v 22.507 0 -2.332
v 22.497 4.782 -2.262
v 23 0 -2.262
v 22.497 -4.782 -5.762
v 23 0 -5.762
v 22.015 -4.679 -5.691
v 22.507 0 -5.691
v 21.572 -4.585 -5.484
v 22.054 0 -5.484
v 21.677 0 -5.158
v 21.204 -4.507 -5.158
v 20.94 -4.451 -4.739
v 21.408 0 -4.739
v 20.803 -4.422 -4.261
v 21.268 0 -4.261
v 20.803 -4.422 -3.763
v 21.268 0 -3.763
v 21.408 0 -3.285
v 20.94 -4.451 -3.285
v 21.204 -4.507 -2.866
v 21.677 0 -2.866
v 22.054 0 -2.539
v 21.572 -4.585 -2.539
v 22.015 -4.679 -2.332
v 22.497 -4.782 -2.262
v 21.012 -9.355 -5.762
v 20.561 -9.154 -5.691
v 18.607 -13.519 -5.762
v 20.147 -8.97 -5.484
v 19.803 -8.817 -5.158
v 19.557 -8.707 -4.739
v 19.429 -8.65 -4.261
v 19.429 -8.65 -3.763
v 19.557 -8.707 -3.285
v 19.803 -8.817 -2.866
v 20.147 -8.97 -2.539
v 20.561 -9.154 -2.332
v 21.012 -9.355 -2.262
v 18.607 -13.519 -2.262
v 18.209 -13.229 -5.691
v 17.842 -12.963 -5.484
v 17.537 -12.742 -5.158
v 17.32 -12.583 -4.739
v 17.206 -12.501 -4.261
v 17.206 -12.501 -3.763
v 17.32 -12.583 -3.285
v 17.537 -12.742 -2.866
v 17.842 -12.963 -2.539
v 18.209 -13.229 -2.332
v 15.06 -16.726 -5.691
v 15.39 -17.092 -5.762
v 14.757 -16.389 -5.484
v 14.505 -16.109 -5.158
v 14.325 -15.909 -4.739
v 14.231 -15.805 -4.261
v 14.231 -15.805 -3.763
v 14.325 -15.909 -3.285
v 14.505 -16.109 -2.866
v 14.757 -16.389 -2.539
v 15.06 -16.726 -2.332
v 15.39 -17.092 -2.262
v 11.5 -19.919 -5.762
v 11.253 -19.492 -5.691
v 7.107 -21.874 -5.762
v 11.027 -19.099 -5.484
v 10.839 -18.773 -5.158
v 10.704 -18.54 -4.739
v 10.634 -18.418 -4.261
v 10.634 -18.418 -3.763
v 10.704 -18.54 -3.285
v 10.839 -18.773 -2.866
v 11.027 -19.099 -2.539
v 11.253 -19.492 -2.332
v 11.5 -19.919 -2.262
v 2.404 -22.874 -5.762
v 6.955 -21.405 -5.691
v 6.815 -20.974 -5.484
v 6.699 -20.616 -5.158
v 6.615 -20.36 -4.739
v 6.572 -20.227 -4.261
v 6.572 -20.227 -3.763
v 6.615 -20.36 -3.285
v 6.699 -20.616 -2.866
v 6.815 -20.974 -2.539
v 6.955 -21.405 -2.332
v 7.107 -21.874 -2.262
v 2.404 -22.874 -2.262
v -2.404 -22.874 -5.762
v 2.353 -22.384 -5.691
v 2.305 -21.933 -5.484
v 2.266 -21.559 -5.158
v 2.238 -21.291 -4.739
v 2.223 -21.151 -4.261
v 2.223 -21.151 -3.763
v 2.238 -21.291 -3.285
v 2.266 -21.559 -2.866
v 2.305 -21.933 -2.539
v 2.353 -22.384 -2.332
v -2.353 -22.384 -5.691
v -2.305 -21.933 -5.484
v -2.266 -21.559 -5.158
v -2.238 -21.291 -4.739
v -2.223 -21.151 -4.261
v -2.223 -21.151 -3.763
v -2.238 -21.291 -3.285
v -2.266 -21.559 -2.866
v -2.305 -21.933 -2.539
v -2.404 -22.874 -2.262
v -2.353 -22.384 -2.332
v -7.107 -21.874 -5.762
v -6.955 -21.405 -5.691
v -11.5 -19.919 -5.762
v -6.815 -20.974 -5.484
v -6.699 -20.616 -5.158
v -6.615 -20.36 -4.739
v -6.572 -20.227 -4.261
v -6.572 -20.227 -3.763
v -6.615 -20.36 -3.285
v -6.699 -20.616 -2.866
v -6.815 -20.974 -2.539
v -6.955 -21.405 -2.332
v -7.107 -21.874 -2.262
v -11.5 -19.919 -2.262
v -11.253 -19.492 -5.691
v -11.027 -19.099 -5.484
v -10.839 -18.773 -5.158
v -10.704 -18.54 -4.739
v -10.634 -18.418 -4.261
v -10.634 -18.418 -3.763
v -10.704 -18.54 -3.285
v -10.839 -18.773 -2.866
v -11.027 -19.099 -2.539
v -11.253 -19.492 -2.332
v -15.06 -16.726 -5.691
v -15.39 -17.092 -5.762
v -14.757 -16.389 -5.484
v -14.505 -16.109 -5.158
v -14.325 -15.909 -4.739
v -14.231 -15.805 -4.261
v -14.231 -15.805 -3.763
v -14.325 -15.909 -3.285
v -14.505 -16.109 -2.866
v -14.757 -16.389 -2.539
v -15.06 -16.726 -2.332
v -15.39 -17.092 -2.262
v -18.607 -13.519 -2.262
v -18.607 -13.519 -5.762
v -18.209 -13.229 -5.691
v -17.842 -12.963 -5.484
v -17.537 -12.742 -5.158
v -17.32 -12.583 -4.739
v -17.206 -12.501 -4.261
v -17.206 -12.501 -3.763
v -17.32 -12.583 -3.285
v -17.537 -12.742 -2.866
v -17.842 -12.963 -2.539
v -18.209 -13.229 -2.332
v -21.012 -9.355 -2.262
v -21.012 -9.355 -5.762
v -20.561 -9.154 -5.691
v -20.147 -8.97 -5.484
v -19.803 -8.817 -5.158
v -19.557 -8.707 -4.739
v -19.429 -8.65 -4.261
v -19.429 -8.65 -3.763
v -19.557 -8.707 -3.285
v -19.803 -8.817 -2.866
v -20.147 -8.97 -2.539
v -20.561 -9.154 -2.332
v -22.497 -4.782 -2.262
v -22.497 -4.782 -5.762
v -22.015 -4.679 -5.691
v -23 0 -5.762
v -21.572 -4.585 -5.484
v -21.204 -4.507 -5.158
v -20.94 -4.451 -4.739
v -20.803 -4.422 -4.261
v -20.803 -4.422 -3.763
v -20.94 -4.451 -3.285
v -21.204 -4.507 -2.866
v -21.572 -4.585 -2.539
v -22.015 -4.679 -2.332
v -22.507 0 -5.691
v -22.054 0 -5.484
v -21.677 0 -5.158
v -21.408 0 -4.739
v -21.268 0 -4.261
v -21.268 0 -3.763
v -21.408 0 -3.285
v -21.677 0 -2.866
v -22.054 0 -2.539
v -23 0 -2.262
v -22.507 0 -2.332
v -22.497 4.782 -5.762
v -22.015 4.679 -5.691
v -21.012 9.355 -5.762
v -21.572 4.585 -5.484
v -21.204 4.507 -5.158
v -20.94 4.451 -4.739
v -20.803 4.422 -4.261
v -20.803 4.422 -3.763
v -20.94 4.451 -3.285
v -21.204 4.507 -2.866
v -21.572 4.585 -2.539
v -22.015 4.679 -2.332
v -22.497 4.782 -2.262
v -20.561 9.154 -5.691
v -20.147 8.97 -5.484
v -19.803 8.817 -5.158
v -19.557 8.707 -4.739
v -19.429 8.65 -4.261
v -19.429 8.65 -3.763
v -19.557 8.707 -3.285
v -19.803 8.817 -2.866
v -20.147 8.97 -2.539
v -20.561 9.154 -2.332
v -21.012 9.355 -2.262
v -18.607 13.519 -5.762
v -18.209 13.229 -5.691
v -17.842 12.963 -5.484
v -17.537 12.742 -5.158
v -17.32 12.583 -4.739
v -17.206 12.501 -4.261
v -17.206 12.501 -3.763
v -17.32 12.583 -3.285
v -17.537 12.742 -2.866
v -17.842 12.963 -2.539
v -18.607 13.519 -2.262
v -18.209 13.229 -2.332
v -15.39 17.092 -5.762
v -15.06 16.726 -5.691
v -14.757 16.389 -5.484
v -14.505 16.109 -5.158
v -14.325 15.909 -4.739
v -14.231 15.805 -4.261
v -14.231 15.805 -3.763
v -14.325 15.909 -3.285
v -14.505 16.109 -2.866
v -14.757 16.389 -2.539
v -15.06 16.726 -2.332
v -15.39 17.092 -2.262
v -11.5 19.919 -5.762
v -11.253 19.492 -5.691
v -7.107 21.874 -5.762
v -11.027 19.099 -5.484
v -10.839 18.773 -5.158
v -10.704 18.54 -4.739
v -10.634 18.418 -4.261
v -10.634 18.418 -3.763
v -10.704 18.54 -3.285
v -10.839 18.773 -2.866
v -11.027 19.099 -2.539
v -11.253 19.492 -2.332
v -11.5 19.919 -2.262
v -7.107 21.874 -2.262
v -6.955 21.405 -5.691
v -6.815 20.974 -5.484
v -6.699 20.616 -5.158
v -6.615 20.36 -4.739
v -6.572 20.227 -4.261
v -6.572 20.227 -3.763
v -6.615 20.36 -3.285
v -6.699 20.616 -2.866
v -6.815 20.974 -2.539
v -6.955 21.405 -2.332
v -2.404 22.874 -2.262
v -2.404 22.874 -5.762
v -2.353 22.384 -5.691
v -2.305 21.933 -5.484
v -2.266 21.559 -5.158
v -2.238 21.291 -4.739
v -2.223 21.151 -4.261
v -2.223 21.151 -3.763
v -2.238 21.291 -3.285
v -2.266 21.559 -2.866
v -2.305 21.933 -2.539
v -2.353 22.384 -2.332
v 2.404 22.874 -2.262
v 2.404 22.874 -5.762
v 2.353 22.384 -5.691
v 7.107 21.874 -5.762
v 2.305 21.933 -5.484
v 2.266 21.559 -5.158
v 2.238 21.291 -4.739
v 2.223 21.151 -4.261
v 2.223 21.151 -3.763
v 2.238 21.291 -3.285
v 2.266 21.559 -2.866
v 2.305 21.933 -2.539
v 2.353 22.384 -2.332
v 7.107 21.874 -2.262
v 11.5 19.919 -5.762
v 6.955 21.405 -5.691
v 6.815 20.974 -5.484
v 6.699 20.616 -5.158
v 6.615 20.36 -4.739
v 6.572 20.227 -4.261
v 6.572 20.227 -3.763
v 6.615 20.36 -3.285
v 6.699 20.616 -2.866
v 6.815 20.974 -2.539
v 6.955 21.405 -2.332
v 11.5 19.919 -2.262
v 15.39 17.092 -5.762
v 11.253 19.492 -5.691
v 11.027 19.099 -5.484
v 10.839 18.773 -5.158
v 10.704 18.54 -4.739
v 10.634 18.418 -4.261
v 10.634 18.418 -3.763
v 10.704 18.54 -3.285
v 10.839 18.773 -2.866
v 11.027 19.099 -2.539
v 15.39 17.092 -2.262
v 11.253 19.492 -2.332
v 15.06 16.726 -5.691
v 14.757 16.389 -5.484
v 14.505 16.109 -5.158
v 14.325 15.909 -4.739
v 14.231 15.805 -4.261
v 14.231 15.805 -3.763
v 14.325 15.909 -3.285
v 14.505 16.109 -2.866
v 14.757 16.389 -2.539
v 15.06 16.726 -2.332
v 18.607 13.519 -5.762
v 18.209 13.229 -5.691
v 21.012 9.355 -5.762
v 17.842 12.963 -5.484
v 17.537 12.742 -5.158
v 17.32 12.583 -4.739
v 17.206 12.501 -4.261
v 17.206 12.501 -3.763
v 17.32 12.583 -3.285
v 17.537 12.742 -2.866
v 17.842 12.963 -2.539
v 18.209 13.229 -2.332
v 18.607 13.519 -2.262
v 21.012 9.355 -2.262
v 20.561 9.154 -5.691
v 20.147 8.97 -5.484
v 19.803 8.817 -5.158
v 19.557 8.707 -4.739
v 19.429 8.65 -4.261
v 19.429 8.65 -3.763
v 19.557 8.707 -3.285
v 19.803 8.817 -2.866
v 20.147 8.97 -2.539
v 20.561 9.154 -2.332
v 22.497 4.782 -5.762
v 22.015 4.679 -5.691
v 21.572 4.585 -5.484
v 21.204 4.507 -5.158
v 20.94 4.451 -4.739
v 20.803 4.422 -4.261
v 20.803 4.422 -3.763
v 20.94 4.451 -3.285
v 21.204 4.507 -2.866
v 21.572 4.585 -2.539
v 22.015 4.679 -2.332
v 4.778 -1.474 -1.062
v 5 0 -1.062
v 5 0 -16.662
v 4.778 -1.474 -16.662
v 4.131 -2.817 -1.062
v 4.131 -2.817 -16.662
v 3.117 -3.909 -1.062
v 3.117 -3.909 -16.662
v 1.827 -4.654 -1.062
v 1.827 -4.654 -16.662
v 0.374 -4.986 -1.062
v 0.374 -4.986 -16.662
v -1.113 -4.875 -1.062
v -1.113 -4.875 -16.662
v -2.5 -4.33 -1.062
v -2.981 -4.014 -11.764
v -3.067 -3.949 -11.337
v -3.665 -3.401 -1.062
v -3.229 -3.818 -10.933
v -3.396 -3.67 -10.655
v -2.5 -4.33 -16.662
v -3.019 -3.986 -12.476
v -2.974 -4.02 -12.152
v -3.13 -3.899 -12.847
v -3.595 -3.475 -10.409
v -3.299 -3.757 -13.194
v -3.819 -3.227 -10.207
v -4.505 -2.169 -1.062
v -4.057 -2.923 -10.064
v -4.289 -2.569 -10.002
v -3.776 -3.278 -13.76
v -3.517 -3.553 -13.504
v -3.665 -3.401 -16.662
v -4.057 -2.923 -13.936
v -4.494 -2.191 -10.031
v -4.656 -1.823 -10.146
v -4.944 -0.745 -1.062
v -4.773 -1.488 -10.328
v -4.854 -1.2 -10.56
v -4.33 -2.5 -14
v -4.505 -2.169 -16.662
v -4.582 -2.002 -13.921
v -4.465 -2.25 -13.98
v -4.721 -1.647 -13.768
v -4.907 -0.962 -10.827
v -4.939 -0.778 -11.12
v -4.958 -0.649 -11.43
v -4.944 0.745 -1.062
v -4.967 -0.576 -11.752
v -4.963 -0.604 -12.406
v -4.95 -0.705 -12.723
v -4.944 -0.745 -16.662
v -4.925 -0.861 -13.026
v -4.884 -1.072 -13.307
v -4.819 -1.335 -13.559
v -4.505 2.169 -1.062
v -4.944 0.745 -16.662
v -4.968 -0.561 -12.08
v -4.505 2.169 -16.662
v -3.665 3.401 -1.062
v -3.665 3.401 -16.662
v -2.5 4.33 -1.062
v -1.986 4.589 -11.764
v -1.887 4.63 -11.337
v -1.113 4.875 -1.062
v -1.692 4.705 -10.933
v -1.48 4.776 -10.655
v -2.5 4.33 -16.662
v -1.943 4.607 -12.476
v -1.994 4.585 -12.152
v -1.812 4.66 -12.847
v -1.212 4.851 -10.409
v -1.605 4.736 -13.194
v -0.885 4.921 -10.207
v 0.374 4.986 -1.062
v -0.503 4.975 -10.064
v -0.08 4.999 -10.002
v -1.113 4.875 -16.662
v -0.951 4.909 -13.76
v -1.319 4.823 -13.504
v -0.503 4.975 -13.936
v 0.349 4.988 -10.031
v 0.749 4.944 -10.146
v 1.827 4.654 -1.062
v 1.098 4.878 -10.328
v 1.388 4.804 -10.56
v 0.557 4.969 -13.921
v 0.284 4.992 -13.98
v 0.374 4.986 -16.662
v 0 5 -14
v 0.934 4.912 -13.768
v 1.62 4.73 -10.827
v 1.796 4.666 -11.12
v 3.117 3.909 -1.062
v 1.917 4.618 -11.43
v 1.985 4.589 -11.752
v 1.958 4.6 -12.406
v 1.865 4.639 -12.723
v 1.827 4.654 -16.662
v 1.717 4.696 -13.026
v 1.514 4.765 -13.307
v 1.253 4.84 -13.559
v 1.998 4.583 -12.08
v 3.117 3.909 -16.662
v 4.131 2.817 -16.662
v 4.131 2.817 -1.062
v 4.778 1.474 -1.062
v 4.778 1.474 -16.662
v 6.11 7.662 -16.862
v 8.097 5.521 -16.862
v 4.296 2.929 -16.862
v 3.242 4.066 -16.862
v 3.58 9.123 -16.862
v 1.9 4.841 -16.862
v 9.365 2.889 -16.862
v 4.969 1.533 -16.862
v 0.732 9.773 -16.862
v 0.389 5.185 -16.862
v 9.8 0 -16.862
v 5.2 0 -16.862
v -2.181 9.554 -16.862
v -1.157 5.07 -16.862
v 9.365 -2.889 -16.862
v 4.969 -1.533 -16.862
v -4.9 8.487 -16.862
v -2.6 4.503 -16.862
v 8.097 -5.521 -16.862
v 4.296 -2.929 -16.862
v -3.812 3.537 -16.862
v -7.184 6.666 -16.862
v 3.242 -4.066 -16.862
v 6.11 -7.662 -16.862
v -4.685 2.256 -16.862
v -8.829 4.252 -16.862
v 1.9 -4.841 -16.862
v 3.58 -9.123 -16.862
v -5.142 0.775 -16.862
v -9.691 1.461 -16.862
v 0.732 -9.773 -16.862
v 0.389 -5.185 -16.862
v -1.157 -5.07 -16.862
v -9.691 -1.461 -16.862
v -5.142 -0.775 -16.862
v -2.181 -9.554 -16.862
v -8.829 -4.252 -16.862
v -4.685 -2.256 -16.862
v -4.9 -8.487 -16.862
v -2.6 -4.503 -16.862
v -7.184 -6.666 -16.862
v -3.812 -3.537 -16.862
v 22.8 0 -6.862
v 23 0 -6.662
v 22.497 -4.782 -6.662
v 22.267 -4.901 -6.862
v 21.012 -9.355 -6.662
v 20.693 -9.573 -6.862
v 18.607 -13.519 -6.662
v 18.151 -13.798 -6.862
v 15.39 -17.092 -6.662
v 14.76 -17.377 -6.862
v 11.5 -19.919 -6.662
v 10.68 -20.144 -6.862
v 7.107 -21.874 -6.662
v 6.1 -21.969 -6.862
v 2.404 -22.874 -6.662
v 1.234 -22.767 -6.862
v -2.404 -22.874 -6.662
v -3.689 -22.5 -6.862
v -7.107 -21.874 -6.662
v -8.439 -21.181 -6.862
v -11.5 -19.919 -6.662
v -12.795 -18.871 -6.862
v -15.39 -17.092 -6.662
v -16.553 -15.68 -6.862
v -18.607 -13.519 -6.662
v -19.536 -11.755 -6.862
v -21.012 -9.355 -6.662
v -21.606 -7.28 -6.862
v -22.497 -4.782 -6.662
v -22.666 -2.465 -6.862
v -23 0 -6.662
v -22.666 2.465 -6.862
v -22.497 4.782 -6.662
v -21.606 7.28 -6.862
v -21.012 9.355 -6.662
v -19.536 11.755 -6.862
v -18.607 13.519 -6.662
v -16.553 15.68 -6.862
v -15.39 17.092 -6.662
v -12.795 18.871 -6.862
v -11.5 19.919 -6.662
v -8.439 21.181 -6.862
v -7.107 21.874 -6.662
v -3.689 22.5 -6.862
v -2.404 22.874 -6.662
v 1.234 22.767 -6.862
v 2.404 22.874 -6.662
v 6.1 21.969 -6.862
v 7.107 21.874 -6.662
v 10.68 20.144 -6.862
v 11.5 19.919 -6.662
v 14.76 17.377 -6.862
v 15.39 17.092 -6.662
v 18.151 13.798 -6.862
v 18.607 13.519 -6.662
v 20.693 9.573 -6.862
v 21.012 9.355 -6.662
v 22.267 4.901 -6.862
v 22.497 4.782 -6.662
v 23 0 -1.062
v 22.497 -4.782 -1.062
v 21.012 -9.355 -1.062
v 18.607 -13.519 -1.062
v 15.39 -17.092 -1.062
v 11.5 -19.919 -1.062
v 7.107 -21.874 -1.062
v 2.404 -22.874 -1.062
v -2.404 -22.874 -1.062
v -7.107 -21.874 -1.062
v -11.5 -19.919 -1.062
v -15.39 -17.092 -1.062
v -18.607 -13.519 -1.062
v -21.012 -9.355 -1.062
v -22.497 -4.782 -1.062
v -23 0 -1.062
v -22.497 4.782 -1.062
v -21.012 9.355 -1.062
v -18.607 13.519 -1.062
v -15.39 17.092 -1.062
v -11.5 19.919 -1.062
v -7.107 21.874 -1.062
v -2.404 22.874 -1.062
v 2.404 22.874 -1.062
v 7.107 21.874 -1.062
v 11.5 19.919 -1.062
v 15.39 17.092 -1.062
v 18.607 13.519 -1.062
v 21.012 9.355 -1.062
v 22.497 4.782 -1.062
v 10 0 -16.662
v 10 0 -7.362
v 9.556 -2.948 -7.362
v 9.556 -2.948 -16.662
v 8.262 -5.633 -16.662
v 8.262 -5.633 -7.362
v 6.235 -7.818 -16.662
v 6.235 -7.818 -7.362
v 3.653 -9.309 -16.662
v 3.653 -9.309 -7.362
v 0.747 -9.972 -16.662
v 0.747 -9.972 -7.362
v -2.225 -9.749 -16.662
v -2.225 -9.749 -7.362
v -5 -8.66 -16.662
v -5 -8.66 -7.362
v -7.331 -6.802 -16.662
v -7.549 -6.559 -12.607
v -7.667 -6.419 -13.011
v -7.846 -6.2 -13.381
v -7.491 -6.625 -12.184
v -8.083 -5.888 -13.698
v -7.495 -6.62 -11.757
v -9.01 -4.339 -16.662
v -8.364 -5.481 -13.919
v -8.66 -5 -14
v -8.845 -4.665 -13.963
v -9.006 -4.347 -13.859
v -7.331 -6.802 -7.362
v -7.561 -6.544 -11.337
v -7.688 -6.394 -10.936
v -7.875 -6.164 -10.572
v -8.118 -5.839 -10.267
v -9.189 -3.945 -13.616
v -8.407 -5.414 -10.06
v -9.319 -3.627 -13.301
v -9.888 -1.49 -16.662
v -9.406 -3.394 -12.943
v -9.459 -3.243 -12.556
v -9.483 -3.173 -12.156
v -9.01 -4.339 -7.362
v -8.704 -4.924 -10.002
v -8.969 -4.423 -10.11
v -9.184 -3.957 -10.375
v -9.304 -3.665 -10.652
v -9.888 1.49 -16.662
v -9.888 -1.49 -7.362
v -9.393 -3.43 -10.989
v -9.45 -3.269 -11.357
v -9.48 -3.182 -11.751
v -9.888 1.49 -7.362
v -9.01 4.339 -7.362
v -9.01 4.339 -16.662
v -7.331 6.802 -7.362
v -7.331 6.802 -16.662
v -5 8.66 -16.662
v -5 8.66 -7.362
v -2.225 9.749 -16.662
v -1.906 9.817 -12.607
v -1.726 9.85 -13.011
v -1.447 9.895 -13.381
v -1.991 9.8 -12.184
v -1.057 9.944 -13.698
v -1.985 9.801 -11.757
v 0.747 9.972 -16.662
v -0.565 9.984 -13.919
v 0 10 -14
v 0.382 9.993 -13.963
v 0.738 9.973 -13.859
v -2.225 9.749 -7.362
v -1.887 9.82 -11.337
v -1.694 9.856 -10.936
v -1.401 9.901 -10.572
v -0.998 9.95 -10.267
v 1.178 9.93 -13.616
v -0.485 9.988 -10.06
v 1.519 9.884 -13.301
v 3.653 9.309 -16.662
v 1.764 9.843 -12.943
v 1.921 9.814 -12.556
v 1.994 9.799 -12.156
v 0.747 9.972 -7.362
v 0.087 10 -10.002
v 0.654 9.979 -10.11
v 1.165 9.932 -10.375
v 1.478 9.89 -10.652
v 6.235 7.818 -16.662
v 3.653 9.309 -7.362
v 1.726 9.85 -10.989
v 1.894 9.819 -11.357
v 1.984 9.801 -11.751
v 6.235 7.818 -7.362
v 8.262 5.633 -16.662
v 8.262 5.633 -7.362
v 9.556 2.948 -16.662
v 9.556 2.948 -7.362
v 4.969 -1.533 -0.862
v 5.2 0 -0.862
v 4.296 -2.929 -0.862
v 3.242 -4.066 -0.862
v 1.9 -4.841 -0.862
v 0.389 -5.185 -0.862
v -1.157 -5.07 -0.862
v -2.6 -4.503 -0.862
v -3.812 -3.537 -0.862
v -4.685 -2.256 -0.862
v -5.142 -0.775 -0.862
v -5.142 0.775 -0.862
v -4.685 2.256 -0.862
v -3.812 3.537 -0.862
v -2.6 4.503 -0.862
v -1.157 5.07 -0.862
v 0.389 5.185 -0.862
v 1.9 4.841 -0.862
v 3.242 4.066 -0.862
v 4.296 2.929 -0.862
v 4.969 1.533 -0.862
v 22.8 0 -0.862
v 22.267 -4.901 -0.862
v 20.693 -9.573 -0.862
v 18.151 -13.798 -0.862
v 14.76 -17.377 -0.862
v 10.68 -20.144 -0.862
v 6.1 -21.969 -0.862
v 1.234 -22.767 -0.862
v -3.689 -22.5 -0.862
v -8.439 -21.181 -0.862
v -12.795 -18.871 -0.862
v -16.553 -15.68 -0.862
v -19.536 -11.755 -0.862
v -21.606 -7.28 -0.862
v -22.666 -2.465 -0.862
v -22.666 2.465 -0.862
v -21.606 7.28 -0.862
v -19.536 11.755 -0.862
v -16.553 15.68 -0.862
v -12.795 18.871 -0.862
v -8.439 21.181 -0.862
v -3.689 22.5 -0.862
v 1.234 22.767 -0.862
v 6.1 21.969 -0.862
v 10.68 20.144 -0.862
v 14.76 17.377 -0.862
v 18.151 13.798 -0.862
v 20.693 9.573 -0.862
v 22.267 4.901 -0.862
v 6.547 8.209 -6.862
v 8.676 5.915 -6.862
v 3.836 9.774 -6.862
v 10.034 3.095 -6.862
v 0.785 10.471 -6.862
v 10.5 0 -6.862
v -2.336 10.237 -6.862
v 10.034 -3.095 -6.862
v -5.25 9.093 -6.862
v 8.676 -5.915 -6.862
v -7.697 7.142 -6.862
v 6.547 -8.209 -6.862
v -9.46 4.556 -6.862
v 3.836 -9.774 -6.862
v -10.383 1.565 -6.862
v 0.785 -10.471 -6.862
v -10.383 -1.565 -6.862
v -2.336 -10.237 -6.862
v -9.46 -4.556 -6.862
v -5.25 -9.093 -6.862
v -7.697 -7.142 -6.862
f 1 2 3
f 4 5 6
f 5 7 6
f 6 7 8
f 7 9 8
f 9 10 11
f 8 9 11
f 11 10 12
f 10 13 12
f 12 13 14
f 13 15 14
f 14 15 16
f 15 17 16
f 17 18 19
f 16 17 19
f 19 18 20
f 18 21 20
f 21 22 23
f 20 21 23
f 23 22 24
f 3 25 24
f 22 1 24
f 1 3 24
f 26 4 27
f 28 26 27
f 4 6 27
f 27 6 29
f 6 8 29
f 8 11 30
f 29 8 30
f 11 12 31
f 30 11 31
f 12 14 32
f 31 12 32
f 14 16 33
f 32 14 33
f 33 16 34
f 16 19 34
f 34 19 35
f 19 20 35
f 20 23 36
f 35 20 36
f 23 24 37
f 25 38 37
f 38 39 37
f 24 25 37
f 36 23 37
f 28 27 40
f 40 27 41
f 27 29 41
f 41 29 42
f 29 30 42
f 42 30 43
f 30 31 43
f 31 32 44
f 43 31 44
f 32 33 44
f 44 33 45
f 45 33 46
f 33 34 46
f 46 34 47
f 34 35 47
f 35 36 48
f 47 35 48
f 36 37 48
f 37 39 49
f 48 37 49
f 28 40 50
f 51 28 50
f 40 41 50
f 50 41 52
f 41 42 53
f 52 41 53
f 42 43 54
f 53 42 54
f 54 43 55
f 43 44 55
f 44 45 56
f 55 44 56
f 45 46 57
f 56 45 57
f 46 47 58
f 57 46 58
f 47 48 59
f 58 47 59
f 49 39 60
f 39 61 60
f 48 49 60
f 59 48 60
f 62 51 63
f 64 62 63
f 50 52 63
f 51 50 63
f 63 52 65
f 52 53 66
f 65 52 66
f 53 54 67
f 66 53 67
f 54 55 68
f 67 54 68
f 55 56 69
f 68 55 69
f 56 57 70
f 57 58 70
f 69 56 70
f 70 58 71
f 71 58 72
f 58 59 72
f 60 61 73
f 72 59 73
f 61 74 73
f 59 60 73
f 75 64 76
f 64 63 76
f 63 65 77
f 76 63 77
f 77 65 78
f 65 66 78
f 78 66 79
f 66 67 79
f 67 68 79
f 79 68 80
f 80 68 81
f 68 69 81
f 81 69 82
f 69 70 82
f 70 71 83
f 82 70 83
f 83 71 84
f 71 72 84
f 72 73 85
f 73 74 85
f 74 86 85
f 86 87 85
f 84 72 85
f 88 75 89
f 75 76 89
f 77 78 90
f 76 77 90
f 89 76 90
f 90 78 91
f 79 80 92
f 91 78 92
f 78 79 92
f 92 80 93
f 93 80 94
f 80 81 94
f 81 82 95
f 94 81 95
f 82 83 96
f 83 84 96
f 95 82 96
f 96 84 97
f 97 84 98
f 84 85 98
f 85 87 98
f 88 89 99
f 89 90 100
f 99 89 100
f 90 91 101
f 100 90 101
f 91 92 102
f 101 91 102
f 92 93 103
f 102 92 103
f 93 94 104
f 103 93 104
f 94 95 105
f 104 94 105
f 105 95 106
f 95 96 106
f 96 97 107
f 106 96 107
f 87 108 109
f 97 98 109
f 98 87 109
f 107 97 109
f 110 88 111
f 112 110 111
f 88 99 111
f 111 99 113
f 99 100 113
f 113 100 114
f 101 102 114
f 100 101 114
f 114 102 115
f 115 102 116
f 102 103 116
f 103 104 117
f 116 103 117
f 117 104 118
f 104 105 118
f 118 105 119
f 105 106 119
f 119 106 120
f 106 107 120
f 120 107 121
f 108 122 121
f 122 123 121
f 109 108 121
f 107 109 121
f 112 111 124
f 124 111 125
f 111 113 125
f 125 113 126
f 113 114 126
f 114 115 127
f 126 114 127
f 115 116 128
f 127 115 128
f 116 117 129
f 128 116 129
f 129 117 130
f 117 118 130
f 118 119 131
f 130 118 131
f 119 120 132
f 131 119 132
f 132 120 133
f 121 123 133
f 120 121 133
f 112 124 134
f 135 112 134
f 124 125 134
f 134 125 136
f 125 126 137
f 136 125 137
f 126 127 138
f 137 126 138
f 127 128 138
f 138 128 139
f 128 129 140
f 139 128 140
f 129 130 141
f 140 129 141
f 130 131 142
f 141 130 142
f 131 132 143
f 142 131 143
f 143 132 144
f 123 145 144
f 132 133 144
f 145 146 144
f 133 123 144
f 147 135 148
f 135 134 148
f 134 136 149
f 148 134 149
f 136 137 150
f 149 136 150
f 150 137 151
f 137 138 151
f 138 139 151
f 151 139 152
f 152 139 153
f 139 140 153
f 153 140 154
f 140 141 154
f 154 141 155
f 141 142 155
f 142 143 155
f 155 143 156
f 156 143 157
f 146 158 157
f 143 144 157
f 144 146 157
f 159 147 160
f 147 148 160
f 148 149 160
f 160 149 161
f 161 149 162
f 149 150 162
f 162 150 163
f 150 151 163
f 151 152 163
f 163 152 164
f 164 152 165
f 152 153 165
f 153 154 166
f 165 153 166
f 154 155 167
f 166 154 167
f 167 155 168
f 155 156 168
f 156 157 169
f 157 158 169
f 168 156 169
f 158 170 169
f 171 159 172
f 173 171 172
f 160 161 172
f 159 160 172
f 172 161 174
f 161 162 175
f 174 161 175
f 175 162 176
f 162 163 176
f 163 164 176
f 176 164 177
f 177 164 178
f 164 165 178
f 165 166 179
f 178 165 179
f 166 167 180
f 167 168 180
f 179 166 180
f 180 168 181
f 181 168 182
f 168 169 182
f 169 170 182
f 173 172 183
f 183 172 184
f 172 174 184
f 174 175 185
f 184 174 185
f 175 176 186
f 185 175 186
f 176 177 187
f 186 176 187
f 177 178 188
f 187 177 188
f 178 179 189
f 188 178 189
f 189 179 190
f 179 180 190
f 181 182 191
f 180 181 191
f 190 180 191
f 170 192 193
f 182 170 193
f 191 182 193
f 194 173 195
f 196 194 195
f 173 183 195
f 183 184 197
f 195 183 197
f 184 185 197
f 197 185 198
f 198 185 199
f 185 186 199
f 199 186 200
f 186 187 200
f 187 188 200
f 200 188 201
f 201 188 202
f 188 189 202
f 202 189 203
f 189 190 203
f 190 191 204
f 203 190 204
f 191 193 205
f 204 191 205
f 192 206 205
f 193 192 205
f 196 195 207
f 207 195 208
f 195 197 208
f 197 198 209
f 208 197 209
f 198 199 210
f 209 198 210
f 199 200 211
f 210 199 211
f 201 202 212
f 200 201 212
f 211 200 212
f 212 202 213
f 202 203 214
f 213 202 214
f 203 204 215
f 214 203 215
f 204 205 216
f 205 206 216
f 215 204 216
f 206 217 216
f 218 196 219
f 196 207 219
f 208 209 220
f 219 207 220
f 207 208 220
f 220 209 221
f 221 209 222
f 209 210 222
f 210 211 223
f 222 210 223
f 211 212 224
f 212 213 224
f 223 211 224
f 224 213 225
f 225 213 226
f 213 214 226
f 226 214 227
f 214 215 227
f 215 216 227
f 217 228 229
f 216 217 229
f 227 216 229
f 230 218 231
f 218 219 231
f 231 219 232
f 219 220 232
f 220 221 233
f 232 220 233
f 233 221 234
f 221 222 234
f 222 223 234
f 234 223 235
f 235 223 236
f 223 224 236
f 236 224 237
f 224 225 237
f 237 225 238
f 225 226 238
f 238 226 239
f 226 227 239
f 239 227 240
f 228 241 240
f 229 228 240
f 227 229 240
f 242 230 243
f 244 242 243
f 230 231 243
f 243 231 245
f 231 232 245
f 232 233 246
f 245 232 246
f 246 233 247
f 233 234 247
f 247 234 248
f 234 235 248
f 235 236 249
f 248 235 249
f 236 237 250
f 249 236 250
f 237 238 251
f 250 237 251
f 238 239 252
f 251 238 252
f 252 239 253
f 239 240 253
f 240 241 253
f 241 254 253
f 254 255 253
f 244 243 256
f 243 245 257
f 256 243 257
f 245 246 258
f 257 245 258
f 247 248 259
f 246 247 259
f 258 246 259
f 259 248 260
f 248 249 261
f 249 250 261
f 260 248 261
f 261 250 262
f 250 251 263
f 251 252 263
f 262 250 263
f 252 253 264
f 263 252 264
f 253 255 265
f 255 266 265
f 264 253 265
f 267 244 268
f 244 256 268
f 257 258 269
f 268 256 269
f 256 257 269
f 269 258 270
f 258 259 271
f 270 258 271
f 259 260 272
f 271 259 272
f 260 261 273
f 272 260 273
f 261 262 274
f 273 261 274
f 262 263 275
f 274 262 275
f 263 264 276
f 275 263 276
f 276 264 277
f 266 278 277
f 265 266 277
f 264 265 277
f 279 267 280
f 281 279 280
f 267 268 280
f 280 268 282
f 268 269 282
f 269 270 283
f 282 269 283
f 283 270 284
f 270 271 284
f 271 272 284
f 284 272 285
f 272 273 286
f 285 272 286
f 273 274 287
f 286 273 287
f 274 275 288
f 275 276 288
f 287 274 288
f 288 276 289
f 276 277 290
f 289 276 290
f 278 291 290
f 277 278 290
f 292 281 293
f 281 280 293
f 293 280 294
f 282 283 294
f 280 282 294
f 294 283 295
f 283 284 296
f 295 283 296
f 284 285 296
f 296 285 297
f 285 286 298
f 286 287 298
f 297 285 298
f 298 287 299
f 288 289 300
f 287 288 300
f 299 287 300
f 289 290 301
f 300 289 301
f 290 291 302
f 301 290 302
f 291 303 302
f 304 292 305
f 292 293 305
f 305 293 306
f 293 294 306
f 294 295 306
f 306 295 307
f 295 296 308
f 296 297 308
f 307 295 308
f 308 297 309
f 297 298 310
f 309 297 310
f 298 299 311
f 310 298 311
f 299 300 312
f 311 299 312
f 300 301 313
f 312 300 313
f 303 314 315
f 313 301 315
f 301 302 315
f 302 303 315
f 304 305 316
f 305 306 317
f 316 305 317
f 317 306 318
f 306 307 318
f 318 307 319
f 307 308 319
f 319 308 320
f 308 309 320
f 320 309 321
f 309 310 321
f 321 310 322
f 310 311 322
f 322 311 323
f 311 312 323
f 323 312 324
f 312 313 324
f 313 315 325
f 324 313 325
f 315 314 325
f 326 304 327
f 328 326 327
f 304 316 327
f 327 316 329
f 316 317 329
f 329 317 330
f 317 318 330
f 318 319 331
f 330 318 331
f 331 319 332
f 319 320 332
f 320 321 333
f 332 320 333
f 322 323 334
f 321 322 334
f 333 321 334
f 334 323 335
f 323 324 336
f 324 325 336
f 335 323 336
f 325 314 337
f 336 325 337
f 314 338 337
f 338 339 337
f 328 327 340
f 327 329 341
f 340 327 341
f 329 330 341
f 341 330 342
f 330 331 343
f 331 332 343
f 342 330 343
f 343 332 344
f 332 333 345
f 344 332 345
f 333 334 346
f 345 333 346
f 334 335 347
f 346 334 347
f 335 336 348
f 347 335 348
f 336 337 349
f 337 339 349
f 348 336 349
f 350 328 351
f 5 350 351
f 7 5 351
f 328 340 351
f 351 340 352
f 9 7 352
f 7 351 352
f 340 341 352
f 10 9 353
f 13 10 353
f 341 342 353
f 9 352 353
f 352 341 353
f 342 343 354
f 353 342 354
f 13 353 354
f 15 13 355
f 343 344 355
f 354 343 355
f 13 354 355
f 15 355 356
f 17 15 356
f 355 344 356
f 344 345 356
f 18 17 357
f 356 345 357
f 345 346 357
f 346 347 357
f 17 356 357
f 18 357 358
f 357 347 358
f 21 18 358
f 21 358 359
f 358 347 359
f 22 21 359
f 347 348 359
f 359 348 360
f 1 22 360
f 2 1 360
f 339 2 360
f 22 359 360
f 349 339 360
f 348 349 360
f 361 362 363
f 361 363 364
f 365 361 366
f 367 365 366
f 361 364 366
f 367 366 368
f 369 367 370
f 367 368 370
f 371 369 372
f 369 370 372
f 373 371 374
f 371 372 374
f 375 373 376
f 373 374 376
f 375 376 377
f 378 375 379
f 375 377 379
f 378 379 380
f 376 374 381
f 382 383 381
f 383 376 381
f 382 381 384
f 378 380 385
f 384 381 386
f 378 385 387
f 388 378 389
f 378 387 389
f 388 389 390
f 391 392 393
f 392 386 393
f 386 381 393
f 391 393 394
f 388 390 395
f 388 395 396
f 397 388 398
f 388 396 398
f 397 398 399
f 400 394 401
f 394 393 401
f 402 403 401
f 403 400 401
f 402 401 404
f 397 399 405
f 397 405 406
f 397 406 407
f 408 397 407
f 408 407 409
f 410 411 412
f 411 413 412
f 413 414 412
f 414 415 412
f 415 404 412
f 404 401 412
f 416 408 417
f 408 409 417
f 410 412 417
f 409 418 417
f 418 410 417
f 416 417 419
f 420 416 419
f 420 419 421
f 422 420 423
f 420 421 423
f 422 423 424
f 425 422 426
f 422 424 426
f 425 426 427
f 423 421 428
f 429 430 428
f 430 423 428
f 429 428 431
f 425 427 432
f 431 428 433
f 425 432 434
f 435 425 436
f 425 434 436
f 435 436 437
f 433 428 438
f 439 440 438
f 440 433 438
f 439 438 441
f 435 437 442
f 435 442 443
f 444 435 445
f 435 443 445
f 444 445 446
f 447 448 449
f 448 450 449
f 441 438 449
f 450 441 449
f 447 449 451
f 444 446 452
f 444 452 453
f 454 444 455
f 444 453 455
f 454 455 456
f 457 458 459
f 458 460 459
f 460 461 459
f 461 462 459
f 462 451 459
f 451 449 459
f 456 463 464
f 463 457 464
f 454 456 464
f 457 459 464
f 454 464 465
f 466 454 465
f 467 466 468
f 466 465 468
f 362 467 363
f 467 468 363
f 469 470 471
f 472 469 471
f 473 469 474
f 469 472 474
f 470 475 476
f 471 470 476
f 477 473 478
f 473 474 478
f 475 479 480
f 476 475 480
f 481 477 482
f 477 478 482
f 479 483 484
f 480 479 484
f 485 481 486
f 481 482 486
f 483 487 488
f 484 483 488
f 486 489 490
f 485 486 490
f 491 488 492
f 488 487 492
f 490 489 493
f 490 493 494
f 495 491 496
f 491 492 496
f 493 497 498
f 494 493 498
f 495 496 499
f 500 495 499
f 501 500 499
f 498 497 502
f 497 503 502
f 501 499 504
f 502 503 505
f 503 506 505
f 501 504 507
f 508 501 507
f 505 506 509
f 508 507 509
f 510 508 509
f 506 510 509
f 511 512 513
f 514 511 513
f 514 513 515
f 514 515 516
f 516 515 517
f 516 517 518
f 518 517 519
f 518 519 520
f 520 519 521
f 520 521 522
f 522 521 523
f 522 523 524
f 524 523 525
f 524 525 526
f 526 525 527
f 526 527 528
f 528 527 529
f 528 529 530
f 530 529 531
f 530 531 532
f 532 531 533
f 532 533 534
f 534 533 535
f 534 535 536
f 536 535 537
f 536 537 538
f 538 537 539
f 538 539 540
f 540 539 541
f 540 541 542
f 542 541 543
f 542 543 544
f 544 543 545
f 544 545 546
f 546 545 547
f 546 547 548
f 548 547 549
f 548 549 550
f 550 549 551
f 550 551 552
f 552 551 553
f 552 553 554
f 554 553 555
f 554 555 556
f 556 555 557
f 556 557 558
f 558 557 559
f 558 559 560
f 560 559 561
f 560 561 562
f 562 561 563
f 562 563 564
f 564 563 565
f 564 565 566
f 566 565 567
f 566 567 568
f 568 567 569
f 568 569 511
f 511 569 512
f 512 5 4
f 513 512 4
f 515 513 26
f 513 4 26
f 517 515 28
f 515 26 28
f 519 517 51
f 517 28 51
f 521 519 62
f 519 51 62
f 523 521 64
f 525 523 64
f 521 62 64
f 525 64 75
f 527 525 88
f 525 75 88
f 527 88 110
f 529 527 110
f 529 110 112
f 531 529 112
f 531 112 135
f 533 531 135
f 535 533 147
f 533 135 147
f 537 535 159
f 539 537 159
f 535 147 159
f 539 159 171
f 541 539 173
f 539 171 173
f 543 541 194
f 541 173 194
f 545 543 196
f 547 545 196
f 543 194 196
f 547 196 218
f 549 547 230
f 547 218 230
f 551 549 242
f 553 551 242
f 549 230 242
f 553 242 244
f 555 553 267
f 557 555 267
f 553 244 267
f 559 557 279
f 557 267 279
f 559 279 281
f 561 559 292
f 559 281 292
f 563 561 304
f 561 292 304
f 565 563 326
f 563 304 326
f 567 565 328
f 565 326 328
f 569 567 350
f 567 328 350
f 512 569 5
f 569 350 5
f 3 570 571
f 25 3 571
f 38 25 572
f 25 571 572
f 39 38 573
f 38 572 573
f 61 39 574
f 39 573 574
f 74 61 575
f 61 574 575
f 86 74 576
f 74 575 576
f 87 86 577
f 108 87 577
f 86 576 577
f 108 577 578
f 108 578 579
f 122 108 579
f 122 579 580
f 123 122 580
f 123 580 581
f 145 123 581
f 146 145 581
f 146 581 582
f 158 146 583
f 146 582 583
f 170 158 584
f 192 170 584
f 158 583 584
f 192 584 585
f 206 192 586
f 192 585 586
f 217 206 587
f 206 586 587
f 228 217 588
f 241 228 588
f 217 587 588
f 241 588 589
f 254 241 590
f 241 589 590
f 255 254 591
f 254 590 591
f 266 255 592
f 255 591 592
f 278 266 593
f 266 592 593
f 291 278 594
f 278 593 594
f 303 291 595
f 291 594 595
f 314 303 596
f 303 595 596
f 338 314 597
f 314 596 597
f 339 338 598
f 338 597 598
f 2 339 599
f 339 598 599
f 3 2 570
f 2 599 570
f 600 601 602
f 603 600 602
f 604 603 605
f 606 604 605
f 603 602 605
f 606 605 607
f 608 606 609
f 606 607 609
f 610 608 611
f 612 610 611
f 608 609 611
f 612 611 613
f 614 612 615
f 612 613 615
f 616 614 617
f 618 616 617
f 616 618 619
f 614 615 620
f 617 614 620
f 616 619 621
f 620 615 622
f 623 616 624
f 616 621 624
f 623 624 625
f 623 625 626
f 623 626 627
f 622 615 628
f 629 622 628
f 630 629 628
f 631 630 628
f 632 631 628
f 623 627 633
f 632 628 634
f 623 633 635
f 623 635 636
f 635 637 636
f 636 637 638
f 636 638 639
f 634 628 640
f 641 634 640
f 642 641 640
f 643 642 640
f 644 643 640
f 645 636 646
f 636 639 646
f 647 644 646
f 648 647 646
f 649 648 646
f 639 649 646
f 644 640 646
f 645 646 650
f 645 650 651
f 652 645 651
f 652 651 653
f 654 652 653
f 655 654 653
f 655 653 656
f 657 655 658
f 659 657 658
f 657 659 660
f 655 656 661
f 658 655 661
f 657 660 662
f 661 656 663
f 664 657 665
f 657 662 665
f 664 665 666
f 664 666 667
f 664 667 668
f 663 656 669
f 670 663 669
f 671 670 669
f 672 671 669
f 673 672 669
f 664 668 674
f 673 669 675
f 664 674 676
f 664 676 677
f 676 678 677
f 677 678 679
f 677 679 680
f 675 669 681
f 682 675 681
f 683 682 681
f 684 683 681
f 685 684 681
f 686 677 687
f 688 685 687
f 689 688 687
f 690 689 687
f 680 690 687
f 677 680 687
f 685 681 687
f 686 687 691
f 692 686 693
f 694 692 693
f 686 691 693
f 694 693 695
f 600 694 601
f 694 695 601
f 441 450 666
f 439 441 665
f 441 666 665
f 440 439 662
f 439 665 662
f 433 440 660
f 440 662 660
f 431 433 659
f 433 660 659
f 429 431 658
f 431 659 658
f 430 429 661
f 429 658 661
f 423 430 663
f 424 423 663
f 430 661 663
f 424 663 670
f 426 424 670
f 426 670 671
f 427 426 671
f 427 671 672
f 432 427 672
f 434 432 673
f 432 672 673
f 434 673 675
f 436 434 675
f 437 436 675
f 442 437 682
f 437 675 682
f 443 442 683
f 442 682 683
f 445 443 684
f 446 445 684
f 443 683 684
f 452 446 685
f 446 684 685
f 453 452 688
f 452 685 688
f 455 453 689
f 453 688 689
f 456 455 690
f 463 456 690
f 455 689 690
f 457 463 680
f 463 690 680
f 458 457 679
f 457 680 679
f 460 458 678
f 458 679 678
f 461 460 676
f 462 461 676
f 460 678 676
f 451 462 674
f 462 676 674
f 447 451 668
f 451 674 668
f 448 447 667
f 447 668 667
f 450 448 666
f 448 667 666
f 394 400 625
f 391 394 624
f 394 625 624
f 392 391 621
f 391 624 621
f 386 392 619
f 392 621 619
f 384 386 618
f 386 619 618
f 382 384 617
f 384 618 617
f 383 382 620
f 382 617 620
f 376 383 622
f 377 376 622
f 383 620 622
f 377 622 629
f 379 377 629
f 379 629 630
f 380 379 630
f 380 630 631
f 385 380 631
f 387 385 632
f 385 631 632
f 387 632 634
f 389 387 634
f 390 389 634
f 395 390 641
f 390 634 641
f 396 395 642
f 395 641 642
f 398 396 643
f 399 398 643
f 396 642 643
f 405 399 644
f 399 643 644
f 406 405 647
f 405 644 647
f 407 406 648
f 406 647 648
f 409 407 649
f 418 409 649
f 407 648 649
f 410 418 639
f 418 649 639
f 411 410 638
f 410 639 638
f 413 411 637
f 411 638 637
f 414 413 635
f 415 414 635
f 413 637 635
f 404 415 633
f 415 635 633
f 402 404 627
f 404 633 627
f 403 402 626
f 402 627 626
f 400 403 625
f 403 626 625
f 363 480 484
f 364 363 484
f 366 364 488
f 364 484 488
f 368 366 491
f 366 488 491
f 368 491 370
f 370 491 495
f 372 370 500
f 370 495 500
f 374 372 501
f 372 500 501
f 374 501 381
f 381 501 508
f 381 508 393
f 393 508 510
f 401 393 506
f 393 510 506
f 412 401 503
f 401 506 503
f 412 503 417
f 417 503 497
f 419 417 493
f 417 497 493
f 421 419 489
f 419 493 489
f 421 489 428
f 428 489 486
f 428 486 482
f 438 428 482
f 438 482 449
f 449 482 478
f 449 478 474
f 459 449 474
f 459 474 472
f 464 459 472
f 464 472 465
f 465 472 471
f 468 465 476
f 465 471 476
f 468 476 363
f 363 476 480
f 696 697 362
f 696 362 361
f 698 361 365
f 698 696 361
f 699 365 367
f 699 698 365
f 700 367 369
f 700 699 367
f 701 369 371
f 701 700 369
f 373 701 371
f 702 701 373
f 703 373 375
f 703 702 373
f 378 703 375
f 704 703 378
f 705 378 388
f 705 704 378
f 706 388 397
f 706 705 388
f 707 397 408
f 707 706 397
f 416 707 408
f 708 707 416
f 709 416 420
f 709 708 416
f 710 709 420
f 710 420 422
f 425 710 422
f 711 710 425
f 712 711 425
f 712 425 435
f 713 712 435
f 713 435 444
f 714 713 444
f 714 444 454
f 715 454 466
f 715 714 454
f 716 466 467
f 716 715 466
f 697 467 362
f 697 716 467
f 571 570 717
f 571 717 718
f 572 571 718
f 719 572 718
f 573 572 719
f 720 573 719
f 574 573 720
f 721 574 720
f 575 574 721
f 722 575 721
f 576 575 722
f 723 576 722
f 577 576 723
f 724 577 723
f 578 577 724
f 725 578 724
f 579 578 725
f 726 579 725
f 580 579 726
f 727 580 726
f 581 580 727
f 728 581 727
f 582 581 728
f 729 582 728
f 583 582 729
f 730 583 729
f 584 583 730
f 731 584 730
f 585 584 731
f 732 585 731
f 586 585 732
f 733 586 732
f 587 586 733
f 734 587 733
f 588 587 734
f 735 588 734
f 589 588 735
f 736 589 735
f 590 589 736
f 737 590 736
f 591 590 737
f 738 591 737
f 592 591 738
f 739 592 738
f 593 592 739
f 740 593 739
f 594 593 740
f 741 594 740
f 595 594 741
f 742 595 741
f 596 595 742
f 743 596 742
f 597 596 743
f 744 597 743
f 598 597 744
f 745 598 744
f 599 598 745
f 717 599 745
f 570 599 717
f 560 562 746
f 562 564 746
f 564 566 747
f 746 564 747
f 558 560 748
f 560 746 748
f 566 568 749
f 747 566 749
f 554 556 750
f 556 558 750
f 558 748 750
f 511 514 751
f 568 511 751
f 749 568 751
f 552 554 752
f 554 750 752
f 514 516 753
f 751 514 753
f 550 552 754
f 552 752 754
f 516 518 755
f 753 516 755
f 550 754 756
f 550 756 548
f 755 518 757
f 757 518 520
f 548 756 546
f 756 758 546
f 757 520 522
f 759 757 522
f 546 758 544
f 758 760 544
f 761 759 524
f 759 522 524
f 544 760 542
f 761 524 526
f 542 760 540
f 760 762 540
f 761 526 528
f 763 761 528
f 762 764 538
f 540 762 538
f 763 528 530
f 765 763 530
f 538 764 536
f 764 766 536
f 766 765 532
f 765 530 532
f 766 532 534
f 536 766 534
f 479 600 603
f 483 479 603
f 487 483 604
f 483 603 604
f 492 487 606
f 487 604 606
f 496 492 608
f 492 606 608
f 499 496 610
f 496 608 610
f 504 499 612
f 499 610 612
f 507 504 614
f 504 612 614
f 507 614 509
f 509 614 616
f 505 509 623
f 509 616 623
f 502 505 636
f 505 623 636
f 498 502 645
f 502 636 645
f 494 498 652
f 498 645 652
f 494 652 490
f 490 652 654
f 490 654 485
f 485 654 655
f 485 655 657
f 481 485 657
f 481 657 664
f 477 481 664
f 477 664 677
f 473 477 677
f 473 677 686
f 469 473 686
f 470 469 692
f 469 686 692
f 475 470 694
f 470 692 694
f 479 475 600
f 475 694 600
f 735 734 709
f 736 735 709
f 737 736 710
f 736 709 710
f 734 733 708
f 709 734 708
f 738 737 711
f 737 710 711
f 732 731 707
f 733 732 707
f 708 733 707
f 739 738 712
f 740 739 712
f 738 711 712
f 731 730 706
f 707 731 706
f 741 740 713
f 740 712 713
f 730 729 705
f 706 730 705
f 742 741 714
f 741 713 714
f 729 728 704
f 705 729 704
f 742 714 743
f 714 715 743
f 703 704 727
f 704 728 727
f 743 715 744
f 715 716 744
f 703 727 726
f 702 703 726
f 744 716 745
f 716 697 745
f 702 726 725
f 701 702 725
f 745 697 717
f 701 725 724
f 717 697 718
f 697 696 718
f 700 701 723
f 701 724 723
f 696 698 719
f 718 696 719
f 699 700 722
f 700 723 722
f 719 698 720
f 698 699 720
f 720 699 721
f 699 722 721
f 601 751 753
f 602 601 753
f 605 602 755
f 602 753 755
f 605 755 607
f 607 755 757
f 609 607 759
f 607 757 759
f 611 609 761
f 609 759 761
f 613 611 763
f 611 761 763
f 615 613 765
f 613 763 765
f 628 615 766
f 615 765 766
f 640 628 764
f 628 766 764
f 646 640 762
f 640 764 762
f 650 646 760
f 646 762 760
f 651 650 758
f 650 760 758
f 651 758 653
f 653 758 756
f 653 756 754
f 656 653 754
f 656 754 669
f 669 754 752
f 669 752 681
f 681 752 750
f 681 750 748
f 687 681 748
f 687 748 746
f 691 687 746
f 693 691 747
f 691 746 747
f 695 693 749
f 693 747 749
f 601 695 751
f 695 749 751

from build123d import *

# Parameters (mm, degrees)
SKETCH_2_W               = 2
SKETCH_2_H               = 31.418584287
PATTERN_CIRCULAR_1_COUNT = 2
PATTERN_CIRCULAR_1_ANGLE = 120
CHAMFER_1_SIZE           = 0.2
CHAMFER_2_SIZE           = 0.5


with BuildPart() as part:
    # 草图1 → 旋转1 (revolve)
    with BuildSketch(Plane(origin=(0, 0, 0), x_dir=(0, 0, -1), z_dir=(1, 0, 0)), mode=Mode.PRIVATE) as revolve_1_sk:
        with BuildLine():
            Line((0.861588836, 5), (16.861588836, 5))
            Line((16.861588836, 5), (16.861588836, 10))
            Line((16.861588836, 10), (6.861588836, 10))
            Line((6.861588836, 10), (6.861588836, 23))
            Line((6.861588836, 23), (5.761588836, 23))
            ThreePointArc((5.761588836, 23), (4.011588836, 21.25), (2.261588836, 23))
            Line((2.261588836, 23), (0.861588836, 23))
            Line((0.861588836, 23), (0.861588836, 5))
        make_face()
    revolve(revolve_1_sk.sketch.rotate(Axis((0, 0, 0), (0, 0, -1)), 90), axis=Axis((0, 0, 0), (0, 0, -1)))

    # 草图2 → M4 螺纹孔1 (revolve, cut)
    with BuildSketch(Plane(origin=(0, 0, -12), x_dir=(0, 0, -1), z_dir=(1, 0, 0))):
        with Locations((1, 15.709292144)):
            Rectangle(SKETCH_2_W, SKETCH_2_H)
    hole_wizard_m4_1 = revolve(axis=Axis((0, -6.35, -12), (0, 1, 0)), mode=Mode.SUBTRACT)

    # 阵列(圆周)1: M4 螺纹孔1 ×2 about axis
    pattern_circular_1_axis = Axis((0, 0, 0), (0, 0, 1))
    for i in range(1, PATTERN_CIRCULAR_1_COUNT):
        add(hole_wizard_m4_1.rotate(pattern_circular_1_axis, i * PATTERN_CIRCULAR_1_ANGLE / (PATTERN_CIRCULAR_1_COUNT - 1)), mode=Mode.SUBTRACT)

    # 倒角1
    chamfer_1_edges = [part.edges().sort_by_distance(p)[0] for p in [
        (-23, 0, -0.861588836),
        (-23, 0, -6.861588836),
        (-10, 0, -16.861588836),
        (-5, 0, -16.861588836),
        (-5, 0, -0.861588836),
    ]]
    chamfer(chamfer_1_edges, length=CHAMFER_1_SIZE)

    # 倒角2
    chamfer_2_edges = [part.edges().sort_by_distance(p)[0] for p in [
        (-10, 0, -6.861588836),
    ]]
    chamfer(chamfer_2_edges, length=CHAMFER_2_SIZE)


solid = part.part
